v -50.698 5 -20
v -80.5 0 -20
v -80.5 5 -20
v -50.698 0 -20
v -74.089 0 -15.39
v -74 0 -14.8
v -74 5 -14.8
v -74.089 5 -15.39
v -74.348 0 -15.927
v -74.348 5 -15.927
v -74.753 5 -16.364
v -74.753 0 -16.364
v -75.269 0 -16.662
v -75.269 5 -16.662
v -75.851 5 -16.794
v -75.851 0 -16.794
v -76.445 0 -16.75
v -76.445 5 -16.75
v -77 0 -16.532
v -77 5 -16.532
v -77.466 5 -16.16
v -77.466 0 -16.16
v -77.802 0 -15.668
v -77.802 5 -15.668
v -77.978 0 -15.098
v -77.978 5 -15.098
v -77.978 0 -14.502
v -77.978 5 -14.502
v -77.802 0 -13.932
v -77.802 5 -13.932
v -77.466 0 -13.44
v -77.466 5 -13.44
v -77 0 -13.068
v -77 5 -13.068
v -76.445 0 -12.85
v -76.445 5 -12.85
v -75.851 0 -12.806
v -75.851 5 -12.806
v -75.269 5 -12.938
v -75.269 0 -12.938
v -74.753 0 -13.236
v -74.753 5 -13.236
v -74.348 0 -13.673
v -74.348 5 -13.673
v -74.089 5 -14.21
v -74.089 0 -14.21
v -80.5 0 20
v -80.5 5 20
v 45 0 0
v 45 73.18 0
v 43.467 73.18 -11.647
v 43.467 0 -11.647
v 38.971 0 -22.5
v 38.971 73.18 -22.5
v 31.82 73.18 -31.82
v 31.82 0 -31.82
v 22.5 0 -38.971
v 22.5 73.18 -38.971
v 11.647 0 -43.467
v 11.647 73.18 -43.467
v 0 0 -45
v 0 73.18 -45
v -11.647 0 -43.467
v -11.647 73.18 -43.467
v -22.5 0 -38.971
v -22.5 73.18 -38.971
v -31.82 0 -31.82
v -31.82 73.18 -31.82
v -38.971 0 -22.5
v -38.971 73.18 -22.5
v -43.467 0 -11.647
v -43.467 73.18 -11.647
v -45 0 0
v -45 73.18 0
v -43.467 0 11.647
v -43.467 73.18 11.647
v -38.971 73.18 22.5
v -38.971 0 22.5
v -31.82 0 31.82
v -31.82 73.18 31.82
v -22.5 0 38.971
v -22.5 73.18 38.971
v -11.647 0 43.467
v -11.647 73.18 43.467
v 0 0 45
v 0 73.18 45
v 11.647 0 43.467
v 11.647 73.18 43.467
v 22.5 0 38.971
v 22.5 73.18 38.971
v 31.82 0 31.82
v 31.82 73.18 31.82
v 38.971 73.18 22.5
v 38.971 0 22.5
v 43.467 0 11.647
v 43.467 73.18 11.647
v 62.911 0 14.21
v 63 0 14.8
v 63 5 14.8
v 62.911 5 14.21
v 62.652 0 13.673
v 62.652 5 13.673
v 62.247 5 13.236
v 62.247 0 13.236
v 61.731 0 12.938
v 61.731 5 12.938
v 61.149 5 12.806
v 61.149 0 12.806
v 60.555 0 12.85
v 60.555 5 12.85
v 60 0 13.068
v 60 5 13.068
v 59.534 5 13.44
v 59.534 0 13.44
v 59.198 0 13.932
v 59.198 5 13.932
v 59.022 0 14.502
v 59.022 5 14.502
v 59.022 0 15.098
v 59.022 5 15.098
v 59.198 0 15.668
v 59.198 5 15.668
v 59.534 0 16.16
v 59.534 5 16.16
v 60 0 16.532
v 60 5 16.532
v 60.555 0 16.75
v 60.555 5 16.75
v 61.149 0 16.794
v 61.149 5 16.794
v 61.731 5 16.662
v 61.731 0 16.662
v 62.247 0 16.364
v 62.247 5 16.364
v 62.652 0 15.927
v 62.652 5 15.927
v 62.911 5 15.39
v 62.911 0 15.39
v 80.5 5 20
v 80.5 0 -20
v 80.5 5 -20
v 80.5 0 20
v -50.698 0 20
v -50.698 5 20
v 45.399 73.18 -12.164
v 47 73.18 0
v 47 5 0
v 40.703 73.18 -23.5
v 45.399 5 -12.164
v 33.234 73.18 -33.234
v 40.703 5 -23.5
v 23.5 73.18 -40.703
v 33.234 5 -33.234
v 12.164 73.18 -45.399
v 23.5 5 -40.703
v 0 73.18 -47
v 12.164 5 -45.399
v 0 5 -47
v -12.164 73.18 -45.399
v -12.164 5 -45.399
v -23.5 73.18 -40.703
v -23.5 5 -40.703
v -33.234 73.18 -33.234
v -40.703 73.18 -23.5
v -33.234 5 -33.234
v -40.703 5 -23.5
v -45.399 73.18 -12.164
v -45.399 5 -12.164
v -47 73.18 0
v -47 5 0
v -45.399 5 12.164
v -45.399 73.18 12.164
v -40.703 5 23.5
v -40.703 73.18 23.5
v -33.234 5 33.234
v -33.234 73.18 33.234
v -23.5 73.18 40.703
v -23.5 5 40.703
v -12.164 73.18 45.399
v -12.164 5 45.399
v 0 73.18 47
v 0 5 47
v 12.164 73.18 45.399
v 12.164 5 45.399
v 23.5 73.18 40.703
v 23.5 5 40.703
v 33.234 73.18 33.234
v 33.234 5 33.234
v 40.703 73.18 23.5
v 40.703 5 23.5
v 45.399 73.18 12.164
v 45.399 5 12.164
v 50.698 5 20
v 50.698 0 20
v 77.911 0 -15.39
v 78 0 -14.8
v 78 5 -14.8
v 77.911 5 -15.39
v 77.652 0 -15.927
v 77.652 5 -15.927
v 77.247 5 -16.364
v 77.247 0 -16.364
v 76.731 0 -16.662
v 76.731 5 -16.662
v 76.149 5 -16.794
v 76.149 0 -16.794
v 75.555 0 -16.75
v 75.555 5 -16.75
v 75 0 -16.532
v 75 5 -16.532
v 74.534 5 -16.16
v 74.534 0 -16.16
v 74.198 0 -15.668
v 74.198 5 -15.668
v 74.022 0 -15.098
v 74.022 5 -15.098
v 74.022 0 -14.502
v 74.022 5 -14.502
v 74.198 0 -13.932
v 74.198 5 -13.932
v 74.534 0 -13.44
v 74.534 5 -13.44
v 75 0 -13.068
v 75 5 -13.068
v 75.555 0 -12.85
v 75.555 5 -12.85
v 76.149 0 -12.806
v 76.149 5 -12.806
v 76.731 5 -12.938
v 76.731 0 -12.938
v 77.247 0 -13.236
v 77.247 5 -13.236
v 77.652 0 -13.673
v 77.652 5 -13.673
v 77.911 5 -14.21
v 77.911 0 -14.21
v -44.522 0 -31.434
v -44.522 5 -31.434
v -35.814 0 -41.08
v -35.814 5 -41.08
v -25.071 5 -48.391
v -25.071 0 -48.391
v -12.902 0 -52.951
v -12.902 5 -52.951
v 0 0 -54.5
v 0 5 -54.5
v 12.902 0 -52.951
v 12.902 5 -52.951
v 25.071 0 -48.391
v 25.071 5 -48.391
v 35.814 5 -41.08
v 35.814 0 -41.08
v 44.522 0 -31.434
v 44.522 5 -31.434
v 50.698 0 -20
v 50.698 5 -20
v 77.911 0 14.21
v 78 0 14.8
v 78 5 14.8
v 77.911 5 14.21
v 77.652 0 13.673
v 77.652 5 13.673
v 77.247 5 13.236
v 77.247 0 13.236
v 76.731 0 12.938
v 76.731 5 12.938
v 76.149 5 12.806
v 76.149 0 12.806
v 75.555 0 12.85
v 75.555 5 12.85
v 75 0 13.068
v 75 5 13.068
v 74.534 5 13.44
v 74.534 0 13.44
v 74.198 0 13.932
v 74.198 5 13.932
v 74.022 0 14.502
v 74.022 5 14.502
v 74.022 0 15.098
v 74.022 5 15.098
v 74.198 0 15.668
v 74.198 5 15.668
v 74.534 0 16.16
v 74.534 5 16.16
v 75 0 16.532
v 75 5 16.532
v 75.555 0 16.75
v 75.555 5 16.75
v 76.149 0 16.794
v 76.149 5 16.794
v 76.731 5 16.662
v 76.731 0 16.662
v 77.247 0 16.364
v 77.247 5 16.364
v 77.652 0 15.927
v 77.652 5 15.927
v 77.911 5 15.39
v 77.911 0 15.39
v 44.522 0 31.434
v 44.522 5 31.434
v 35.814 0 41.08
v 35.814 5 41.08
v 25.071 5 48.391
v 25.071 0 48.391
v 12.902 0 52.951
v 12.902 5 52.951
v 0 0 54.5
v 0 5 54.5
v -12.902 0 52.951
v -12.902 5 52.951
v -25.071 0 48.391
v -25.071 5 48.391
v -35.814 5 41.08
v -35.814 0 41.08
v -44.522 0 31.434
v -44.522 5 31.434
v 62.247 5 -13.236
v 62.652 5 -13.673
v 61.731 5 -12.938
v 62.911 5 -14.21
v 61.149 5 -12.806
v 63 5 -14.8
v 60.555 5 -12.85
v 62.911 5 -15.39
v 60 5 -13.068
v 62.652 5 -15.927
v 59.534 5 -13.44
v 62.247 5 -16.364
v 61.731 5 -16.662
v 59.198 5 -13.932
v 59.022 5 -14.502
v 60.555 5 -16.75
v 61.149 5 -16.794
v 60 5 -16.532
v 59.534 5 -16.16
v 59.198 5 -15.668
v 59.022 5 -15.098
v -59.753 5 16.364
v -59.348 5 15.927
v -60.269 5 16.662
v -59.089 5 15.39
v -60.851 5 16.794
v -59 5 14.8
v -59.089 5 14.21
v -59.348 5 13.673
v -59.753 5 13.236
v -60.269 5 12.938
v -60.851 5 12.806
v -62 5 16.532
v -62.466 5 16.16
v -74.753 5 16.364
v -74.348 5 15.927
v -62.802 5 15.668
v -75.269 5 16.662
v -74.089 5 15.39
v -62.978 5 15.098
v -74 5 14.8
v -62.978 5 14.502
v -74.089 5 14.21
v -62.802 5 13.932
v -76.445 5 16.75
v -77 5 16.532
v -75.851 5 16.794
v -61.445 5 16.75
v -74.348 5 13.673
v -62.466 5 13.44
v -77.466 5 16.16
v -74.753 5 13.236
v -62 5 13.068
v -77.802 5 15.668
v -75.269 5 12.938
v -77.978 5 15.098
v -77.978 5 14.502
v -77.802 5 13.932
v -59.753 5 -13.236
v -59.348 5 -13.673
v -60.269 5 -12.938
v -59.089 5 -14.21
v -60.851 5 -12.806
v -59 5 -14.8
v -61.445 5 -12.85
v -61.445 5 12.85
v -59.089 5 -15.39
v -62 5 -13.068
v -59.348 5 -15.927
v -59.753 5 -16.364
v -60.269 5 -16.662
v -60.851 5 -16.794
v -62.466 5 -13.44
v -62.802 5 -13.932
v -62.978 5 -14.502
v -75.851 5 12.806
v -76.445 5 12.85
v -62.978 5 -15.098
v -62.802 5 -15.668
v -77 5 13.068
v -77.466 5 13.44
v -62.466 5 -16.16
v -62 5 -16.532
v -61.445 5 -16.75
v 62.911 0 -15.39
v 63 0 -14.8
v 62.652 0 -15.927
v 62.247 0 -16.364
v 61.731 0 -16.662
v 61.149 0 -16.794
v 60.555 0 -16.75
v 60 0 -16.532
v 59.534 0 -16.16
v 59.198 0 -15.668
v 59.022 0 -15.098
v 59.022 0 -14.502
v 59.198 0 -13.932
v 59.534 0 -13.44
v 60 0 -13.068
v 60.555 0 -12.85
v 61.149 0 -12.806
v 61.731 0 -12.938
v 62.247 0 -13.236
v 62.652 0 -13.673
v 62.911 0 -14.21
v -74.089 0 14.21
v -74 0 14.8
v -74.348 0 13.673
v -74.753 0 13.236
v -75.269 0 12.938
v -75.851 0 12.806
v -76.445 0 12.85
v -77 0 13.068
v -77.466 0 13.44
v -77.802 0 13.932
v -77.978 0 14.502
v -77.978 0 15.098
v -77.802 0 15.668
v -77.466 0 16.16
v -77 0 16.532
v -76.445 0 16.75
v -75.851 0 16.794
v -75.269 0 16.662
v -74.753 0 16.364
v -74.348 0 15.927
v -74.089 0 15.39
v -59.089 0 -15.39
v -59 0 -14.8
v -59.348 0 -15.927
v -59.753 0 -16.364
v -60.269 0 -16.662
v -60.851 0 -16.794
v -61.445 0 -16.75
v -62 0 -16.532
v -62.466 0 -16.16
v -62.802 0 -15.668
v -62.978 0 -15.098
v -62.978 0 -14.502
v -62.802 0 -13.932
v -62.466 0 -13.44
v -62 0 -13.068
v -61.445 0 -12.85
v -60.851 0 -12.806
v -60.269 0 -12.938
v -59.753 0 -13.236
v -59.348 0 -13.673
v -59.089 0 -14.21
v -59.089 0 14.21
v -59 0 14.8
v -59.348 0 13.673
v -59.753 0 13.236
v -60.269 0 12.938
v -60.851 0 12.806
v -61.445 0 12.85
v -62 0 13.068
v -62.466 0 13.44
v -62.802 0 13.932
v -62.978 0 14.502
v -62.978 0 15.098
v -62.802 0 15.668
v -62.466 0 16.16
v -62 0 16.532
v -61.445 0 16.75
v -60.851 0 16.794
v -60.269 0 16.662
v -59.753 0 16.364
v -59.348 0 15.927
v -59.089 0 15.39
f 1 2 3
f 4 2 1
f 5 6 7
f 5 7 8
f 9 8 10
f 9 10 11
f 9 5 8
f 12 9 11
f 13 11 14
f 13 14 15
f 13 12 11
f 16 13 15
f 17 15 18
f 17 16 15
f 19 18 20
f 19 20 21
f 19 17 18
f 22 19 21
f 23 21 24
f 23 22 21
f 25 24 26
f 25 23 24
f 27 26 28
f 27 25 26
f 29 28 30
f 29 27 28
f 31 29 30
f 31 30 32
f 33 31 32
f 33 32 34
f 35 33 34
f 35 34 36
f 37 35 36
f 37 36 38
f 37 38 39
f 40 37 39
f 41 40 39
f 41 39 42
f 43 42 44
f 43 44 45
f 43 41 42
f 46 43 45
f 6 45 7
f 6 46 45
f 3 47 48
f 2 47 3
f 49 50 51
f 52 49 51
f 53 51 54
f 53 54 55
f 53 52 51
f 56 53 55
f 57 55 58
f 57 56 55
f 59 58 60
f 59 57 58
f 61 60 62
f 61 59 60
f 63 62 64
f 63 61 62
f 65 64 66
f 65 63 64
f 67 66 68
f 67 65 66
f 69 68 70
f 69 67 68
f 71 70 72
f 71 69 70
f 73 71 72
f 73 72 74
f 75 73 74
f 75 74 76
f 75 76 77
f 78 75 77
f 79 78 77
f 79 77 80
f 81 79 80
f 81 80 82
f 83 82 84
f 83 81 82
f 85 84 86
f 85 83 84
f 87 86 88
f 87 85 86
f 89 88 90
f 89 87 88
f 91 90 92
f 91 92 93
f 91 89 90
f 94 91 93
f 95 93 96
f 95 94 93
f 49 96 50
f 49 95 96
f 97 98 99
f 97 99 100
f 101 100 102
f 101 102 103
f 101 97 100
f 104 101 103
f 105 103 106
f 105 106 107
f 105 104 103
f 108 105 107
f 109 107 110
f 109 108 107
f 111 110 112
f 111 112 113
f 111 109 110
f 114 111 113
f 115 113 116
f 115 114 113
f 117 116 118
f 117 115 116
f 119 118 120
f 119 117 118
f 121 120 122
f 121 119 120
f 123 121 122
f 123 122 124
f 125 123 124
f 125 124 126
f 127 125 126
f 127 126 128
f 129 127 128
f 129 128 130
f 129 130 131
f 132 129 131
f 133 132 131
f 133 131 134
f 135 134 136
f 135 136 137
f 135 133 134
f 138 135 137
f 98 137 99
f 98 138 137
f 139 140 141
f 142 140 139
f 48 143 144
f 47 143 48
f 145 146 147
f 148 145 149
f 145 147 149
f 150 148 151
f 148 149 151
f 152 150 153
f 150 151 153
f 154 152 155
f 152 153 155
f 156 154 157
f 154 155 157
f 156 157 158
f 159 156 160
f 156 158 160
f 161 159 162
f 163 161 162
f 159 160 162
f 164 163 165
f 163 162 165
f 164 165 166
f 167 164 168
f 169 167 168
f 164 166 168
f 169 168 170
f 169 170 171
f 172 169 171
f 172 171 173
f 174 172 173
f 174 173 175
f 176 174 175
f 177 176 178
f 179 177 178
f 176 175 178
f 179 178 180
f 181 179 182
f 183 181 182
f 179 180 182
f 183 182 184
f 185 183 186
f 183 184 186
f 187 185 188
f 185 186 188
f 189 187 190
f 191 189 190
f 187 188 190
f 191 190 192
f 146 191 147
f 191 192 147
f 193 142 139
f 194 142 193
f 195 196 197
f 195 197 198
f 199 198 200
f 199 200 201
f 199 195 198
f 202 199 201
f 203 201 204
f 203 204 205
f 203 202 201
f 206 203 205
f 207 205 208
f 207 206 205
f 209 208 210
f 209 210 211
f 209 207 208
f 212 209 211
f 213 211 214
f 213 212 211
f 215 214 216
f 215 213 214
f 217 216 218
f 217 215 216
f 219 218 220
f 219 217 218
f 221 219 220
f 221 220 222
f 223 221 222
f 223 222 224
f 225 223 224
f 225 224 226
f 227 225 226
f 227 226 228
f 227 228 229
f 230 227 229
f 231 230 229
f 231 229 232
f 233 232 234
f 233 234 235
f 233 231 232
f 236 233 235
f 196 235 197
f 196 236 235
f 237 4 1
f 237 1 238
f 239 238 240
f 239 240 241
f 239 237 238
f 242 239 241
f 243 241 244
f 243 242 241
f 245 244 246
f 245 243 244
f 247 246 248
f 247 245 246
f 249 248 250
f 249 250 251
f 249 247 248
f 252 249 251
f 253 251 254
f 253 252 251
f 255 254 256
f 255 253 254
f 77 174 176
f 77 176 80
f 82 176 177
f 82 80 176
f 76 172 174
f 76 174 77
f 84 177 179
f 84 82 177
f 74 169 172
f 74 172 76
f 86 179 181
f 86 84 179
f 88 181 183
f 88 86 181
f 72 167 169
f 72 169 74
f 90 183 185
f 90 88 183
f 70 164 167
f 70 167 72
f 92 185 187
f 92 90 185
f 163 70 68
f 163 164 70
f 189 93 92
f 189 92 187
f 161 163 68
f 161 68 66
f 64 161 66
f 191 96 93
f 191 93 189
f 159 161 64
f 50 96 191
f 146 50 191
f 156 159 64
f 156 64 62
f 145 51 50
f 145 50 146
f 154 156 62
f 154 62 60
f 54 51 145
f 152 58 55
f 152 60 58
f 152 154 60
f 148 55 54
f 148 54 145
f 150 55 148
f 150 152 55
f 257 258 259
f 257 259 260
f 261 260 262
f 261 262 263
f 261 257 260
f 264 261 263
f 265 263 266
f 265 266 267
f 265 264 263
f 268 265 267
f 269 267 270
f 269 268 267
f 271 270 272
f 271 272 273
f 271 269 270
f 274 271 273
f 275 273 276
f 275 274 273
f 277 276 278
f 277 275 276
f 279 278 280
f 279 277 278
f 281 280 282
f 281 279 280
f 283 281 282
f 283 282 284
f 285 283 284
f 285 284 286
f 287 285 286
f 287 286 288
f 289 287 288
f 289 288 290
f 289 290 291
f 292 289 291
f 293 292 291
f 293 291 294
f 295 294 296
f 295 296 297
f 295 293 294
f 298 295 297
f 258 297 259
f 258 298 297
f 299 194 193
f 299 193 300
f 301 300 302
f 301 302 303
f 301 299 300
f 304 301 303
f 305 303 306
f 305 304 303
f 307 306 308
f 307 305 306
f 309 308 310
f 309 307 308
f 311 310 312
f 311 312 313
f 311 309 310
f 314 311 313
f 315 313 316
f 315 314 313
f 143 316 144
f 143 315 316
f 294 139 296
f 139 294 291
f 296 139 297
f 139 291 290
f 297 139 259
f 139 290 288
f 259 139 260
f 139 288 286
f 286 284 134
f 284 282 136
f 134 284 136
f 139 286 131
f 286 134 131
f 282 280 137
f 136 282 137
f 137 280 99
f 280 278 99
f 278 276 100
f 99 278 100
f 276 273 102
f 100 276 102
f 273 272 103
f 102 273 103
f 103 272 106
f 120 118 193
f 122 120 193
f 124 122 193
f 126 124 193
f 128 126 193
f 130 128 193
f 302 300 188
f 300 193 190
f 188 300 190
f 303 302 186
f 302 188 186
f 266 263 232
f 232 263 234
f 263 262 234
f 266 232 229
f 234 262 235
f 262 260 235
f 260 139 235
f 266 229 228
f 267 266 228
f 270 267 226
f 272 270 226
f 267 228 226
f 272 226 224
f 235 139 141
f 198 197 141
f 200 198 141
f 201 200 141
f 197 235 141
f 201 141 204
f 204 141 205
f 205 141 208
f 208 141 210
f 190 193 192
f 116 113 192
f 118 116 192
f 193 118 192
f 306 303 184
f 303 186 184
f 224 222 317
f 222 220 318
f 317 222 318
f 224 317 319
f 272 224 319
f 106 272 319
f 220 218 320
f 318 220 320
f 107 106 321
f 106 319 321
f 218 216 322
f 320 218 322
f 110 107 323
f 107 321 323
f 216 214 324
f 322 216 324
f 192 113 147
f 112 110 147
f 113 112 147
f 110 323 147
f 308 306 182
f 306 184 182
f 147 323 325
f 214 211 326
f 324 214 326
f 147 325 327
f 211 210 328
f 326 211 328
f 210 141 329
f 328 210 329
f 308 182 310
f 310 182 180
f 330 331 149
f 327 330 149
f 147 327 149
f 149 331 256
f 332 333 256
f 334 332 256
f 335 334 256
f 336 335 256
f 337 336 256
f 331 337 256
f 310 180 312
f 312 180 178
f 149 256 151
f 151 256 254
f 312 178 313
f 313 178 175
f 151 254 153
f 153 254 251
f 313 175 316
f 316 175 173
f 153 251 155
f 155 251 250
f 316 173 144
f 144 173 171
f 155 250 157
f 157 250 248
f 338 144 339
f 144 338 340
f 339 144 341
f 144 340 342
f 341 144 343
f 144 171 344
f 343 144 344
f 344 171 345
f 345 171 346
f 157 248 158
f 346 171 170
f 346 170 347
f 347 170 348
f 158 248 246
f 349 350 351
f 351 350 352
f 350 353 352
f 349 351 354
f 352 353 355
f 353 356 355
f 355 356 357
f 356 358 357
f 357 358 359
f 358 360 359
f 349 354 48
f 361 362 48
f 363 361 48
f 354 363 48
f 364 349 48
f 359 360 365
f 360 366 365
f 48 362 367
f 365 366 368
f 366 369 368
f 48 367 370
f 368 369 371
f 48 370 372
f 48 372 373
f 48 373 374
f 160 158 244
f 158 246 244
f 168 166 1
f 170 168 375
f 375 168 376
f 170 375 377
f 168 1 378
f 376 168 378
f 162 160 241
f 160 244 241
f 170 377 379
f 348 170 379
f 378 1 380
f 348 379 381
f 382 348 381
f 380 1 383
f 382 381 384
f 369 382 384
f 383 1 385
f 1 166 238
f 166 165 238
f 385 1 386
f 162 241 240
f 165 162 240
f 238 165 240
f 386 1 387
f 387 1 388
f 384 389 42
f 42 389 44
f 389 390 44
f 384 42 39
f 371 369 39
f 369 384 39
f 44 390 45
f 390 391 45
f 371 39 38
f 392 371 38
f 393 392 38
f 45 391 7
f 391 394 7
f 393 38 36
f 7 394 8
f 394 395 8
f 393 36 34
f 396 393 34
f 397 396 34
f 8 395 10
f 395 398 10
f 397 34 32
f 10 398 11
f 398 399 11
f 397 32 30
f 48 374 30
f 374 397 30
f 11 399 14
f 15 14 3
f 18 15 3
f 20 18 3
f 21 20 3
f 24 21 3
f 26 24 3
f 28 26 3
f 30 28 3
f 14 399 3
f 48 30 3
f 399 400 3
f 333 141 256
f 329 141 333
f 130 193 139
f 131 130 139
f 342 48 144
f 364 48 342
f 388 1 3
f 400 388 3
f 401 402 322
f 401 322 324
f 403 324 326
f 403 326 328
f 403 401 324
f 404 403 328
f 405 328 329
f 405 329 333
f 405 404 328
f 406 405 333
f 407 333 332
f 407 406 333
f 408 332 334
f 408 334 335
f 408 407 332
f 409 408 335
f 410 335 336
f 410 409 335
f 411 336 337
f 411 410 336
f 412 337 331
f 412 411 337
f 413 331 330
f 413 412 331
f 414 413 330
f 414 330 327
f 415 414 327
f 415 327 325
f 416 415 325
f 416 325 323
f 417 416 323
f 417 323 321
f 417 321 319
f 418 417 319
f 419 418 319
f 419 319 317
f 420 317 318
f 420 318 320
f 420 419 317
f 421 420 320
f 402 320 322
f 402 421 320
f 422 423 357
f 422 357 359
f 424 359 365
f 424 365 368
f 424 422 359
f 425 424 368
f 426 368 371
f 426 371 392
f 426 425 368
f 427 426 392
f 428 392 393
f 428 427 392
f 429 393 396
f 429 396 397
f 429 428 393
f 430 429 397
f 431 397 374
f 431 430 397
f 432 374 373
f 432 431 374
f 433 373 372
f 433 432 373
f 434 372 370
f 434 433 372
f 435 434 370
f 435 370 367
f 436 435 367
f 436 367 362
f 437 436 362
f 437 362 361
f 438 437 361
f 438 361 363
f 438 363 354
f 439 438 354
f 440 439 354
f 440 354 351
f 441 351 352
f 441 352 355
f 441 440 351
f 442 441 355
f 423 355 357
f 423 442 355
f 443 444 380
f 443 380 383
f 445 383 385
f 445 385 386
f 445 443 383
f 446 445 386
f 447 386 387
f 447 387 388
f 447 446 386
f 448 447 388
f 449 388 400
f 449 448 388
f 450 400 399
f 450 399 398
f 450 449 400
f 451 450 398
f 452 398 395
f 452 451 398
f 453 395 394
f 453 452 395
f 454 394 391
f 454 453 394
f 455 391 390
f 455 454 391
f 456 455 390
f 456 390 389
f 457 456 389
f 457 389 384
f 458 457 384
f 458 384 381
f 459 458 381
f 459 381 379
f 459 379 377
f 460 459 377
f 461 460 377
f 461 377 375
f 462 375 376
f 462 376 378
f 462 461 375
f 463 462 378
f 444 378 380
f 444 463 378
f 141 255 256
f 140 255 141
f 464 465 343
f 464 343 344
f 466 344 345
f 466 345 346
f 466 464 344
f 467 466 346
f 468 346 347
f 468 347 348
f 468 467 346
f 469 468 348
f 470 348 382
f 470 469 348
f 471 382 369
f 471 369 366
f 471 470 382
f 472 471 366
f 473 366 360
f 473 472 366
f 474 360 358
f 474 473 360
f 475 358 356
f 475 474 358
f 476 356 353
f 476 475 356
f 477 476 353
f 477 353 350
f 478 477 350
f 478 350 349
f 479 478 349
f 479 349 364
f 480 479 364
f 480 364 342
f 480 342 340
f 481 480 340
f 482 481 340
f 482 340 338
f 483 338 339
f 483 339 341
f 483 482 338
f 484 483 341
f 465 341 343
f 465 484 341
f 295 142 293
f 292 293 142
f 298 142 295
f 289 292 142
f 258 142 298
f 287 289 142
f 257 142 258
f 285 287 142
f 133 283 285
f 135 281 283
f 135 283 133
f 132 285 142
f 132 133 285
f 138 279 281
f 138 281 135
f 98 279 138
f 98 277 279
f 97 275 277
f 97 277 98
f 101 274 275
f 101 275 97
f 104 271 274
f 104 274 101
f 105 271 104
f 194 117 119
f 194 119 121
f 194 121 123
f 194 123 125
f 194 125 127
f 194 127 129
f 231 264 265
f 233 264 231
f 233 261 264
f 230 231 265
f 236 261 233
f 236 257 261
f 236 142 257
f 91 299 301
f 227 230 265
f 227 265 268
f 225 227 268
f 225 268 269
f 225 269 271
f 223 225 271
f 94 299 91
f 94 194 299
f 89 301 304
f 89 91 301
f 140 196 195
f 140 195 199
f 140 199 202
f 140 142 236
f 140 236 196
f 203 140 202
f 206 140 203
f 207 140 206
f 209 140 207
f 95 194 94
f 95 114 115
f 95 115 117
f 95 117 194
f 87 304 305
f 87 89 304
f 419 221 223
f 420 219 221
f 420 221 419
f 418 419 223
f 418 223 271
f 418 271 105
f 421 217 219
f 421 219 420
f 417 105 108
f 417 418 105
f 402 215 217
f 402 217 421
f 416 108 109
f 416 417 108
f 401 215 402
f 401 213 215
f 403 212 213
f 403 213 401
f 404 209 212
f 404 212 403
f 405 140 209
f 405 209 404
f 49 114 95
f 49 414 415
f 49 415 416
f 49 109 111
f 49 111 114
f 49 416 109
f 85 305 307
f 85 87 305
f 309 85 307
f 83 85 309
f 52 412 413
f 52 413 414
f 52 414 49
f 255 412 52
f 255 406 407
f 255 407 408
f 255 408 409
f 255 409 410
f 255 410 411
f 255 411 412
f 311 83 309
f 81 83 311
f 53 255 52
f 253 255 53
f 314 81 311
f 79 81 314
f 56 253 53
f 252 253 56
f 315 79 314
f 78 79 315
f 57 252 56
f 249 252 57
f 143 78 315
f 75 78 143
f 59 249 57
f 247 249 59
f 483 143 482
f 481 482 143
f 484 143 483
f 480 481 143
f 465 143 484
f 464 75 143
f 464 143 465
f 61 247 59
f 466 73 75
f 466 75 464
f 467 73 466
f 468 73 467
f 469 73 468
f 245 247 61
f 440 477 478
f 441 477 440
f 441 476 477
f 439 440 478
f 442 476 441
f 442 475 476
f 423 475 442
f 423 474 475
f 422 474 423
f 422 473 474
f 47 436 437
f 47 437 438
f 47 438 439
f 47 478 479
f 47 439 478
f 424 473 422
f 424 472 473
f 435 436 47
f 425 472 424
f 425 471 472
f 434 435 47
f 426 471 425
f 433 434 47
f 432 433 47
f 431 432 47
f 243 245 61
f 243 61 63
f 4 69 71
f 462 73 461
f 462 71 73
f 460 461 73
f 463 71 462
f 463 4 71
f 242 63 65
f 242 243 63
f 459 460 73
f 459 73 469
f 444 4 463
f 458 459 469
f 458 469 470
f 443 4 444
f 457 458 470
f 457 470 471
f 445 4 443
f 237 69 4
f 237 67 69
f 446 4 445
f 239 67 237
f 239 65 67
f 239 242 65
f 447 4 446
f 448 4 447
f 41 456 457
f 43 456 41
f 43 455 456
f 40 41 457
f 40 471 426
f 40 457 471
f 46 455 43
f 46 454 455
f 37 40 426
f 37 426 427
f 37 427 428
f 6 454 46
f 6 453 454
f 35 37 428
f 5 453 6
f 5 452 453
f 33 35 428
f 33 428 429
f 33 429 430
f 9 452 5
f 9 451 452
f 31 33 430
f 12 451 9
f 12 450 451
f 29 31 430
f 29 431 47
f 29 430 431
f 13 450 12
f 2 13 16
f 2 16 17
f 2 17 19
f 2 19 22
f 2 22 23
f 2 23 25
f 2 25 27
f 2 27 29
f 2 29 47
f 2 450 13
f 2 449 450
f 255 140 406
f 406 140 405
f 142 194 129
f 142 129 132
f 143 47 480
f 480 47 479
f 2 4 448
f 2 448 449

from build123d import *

# Parameters (mm, degrees)
SKETCH_1_R      = 45
SKETCH_1_R_2    = 2
EXTRUDE_1_DEPTH = 5
SKETCH_2_R      = 47
SKETCH_2_R_2    = 45
EXTRUDE_2_DEPTH = 68.18


with BuildPart() as part:
    # 草图1 → 凸台-拉伸1 (new body)
    with BuildSketch(Plane(origin=(0, 0, 0), x_dir=(1, 0, 0), z_dir=(0, 1, 0))):
        with BuildLine():
            Line((50.697633081, 20), (80.5, 20))
            Line((80.5, 20), (80.5, -20))
            Line((80.5, -20), (50.697633081, -20))
            ThreePointArc((50.697633081, -20), (0, -54.5), (-50.697633081, -20))
            Line((-50.697633081, -20), (-80.5, -20))
            Line((-80.5, -20), (-80.5, 20))
            Line((-80.5, 20), (-50.697633081, 20))
            ThreePointArc((-50.697633081, 20), (0, 54.5), (50.697633081, 20))
        make_face()
        Circle(SKETCH_1_R, mode=Mode.SUBTRACT)
        with Locations((76, -14.8)):
            Circle(SKETCH_1_R_2, mode=Mode.SUBTRACT)
        with Locations((61, -14.8)):
            Circle(SKETCH_1_R_2, mode=Mode.SUBTRACT)
        with Locations((76, 14.8)):
            Circle(SKETCH_1_R_2, mode=Mode.SUBTRACT)
        with Locations((61, 14.8)):
            Circle(SKETCH_1_R_2, mode=Mode.SUBTRACT)
        with Locations((-61, 14.8)):
            Circle(SKETCH_1_R_2, mode=Mode.SUBTRACT)
        with Locations((-76, 14.8)):
            Circle(SKETCH_1_R_2, mode=Mode.SUBTRACT)
        with Locations((-76, -14.8)):
            Circle(SKETCH_1_R_2, mode=Mode.SUBTRACT)
        with Locations((-61, -14.8)):
            Circle(SKETCH_1_R_2, mode=Mode.SUBTRACT)
    extrude(amount=EXTRUDE_1_DEPTH)

    # 草图2 → 凸台-拉伸2 (add)
    with BuildSketch(Plane(origin=(0, 5, 0), x_dir=(1, 0, 0), z_dir=(0, 1, 0))):
        Circle(SKETCH_2_R)
        Circle(SKETCH_2_R_2, mode=Mode.SUBTRACT)
    extrude(amount=EXTRUDE_2_DEPTH)


solid = part.part
